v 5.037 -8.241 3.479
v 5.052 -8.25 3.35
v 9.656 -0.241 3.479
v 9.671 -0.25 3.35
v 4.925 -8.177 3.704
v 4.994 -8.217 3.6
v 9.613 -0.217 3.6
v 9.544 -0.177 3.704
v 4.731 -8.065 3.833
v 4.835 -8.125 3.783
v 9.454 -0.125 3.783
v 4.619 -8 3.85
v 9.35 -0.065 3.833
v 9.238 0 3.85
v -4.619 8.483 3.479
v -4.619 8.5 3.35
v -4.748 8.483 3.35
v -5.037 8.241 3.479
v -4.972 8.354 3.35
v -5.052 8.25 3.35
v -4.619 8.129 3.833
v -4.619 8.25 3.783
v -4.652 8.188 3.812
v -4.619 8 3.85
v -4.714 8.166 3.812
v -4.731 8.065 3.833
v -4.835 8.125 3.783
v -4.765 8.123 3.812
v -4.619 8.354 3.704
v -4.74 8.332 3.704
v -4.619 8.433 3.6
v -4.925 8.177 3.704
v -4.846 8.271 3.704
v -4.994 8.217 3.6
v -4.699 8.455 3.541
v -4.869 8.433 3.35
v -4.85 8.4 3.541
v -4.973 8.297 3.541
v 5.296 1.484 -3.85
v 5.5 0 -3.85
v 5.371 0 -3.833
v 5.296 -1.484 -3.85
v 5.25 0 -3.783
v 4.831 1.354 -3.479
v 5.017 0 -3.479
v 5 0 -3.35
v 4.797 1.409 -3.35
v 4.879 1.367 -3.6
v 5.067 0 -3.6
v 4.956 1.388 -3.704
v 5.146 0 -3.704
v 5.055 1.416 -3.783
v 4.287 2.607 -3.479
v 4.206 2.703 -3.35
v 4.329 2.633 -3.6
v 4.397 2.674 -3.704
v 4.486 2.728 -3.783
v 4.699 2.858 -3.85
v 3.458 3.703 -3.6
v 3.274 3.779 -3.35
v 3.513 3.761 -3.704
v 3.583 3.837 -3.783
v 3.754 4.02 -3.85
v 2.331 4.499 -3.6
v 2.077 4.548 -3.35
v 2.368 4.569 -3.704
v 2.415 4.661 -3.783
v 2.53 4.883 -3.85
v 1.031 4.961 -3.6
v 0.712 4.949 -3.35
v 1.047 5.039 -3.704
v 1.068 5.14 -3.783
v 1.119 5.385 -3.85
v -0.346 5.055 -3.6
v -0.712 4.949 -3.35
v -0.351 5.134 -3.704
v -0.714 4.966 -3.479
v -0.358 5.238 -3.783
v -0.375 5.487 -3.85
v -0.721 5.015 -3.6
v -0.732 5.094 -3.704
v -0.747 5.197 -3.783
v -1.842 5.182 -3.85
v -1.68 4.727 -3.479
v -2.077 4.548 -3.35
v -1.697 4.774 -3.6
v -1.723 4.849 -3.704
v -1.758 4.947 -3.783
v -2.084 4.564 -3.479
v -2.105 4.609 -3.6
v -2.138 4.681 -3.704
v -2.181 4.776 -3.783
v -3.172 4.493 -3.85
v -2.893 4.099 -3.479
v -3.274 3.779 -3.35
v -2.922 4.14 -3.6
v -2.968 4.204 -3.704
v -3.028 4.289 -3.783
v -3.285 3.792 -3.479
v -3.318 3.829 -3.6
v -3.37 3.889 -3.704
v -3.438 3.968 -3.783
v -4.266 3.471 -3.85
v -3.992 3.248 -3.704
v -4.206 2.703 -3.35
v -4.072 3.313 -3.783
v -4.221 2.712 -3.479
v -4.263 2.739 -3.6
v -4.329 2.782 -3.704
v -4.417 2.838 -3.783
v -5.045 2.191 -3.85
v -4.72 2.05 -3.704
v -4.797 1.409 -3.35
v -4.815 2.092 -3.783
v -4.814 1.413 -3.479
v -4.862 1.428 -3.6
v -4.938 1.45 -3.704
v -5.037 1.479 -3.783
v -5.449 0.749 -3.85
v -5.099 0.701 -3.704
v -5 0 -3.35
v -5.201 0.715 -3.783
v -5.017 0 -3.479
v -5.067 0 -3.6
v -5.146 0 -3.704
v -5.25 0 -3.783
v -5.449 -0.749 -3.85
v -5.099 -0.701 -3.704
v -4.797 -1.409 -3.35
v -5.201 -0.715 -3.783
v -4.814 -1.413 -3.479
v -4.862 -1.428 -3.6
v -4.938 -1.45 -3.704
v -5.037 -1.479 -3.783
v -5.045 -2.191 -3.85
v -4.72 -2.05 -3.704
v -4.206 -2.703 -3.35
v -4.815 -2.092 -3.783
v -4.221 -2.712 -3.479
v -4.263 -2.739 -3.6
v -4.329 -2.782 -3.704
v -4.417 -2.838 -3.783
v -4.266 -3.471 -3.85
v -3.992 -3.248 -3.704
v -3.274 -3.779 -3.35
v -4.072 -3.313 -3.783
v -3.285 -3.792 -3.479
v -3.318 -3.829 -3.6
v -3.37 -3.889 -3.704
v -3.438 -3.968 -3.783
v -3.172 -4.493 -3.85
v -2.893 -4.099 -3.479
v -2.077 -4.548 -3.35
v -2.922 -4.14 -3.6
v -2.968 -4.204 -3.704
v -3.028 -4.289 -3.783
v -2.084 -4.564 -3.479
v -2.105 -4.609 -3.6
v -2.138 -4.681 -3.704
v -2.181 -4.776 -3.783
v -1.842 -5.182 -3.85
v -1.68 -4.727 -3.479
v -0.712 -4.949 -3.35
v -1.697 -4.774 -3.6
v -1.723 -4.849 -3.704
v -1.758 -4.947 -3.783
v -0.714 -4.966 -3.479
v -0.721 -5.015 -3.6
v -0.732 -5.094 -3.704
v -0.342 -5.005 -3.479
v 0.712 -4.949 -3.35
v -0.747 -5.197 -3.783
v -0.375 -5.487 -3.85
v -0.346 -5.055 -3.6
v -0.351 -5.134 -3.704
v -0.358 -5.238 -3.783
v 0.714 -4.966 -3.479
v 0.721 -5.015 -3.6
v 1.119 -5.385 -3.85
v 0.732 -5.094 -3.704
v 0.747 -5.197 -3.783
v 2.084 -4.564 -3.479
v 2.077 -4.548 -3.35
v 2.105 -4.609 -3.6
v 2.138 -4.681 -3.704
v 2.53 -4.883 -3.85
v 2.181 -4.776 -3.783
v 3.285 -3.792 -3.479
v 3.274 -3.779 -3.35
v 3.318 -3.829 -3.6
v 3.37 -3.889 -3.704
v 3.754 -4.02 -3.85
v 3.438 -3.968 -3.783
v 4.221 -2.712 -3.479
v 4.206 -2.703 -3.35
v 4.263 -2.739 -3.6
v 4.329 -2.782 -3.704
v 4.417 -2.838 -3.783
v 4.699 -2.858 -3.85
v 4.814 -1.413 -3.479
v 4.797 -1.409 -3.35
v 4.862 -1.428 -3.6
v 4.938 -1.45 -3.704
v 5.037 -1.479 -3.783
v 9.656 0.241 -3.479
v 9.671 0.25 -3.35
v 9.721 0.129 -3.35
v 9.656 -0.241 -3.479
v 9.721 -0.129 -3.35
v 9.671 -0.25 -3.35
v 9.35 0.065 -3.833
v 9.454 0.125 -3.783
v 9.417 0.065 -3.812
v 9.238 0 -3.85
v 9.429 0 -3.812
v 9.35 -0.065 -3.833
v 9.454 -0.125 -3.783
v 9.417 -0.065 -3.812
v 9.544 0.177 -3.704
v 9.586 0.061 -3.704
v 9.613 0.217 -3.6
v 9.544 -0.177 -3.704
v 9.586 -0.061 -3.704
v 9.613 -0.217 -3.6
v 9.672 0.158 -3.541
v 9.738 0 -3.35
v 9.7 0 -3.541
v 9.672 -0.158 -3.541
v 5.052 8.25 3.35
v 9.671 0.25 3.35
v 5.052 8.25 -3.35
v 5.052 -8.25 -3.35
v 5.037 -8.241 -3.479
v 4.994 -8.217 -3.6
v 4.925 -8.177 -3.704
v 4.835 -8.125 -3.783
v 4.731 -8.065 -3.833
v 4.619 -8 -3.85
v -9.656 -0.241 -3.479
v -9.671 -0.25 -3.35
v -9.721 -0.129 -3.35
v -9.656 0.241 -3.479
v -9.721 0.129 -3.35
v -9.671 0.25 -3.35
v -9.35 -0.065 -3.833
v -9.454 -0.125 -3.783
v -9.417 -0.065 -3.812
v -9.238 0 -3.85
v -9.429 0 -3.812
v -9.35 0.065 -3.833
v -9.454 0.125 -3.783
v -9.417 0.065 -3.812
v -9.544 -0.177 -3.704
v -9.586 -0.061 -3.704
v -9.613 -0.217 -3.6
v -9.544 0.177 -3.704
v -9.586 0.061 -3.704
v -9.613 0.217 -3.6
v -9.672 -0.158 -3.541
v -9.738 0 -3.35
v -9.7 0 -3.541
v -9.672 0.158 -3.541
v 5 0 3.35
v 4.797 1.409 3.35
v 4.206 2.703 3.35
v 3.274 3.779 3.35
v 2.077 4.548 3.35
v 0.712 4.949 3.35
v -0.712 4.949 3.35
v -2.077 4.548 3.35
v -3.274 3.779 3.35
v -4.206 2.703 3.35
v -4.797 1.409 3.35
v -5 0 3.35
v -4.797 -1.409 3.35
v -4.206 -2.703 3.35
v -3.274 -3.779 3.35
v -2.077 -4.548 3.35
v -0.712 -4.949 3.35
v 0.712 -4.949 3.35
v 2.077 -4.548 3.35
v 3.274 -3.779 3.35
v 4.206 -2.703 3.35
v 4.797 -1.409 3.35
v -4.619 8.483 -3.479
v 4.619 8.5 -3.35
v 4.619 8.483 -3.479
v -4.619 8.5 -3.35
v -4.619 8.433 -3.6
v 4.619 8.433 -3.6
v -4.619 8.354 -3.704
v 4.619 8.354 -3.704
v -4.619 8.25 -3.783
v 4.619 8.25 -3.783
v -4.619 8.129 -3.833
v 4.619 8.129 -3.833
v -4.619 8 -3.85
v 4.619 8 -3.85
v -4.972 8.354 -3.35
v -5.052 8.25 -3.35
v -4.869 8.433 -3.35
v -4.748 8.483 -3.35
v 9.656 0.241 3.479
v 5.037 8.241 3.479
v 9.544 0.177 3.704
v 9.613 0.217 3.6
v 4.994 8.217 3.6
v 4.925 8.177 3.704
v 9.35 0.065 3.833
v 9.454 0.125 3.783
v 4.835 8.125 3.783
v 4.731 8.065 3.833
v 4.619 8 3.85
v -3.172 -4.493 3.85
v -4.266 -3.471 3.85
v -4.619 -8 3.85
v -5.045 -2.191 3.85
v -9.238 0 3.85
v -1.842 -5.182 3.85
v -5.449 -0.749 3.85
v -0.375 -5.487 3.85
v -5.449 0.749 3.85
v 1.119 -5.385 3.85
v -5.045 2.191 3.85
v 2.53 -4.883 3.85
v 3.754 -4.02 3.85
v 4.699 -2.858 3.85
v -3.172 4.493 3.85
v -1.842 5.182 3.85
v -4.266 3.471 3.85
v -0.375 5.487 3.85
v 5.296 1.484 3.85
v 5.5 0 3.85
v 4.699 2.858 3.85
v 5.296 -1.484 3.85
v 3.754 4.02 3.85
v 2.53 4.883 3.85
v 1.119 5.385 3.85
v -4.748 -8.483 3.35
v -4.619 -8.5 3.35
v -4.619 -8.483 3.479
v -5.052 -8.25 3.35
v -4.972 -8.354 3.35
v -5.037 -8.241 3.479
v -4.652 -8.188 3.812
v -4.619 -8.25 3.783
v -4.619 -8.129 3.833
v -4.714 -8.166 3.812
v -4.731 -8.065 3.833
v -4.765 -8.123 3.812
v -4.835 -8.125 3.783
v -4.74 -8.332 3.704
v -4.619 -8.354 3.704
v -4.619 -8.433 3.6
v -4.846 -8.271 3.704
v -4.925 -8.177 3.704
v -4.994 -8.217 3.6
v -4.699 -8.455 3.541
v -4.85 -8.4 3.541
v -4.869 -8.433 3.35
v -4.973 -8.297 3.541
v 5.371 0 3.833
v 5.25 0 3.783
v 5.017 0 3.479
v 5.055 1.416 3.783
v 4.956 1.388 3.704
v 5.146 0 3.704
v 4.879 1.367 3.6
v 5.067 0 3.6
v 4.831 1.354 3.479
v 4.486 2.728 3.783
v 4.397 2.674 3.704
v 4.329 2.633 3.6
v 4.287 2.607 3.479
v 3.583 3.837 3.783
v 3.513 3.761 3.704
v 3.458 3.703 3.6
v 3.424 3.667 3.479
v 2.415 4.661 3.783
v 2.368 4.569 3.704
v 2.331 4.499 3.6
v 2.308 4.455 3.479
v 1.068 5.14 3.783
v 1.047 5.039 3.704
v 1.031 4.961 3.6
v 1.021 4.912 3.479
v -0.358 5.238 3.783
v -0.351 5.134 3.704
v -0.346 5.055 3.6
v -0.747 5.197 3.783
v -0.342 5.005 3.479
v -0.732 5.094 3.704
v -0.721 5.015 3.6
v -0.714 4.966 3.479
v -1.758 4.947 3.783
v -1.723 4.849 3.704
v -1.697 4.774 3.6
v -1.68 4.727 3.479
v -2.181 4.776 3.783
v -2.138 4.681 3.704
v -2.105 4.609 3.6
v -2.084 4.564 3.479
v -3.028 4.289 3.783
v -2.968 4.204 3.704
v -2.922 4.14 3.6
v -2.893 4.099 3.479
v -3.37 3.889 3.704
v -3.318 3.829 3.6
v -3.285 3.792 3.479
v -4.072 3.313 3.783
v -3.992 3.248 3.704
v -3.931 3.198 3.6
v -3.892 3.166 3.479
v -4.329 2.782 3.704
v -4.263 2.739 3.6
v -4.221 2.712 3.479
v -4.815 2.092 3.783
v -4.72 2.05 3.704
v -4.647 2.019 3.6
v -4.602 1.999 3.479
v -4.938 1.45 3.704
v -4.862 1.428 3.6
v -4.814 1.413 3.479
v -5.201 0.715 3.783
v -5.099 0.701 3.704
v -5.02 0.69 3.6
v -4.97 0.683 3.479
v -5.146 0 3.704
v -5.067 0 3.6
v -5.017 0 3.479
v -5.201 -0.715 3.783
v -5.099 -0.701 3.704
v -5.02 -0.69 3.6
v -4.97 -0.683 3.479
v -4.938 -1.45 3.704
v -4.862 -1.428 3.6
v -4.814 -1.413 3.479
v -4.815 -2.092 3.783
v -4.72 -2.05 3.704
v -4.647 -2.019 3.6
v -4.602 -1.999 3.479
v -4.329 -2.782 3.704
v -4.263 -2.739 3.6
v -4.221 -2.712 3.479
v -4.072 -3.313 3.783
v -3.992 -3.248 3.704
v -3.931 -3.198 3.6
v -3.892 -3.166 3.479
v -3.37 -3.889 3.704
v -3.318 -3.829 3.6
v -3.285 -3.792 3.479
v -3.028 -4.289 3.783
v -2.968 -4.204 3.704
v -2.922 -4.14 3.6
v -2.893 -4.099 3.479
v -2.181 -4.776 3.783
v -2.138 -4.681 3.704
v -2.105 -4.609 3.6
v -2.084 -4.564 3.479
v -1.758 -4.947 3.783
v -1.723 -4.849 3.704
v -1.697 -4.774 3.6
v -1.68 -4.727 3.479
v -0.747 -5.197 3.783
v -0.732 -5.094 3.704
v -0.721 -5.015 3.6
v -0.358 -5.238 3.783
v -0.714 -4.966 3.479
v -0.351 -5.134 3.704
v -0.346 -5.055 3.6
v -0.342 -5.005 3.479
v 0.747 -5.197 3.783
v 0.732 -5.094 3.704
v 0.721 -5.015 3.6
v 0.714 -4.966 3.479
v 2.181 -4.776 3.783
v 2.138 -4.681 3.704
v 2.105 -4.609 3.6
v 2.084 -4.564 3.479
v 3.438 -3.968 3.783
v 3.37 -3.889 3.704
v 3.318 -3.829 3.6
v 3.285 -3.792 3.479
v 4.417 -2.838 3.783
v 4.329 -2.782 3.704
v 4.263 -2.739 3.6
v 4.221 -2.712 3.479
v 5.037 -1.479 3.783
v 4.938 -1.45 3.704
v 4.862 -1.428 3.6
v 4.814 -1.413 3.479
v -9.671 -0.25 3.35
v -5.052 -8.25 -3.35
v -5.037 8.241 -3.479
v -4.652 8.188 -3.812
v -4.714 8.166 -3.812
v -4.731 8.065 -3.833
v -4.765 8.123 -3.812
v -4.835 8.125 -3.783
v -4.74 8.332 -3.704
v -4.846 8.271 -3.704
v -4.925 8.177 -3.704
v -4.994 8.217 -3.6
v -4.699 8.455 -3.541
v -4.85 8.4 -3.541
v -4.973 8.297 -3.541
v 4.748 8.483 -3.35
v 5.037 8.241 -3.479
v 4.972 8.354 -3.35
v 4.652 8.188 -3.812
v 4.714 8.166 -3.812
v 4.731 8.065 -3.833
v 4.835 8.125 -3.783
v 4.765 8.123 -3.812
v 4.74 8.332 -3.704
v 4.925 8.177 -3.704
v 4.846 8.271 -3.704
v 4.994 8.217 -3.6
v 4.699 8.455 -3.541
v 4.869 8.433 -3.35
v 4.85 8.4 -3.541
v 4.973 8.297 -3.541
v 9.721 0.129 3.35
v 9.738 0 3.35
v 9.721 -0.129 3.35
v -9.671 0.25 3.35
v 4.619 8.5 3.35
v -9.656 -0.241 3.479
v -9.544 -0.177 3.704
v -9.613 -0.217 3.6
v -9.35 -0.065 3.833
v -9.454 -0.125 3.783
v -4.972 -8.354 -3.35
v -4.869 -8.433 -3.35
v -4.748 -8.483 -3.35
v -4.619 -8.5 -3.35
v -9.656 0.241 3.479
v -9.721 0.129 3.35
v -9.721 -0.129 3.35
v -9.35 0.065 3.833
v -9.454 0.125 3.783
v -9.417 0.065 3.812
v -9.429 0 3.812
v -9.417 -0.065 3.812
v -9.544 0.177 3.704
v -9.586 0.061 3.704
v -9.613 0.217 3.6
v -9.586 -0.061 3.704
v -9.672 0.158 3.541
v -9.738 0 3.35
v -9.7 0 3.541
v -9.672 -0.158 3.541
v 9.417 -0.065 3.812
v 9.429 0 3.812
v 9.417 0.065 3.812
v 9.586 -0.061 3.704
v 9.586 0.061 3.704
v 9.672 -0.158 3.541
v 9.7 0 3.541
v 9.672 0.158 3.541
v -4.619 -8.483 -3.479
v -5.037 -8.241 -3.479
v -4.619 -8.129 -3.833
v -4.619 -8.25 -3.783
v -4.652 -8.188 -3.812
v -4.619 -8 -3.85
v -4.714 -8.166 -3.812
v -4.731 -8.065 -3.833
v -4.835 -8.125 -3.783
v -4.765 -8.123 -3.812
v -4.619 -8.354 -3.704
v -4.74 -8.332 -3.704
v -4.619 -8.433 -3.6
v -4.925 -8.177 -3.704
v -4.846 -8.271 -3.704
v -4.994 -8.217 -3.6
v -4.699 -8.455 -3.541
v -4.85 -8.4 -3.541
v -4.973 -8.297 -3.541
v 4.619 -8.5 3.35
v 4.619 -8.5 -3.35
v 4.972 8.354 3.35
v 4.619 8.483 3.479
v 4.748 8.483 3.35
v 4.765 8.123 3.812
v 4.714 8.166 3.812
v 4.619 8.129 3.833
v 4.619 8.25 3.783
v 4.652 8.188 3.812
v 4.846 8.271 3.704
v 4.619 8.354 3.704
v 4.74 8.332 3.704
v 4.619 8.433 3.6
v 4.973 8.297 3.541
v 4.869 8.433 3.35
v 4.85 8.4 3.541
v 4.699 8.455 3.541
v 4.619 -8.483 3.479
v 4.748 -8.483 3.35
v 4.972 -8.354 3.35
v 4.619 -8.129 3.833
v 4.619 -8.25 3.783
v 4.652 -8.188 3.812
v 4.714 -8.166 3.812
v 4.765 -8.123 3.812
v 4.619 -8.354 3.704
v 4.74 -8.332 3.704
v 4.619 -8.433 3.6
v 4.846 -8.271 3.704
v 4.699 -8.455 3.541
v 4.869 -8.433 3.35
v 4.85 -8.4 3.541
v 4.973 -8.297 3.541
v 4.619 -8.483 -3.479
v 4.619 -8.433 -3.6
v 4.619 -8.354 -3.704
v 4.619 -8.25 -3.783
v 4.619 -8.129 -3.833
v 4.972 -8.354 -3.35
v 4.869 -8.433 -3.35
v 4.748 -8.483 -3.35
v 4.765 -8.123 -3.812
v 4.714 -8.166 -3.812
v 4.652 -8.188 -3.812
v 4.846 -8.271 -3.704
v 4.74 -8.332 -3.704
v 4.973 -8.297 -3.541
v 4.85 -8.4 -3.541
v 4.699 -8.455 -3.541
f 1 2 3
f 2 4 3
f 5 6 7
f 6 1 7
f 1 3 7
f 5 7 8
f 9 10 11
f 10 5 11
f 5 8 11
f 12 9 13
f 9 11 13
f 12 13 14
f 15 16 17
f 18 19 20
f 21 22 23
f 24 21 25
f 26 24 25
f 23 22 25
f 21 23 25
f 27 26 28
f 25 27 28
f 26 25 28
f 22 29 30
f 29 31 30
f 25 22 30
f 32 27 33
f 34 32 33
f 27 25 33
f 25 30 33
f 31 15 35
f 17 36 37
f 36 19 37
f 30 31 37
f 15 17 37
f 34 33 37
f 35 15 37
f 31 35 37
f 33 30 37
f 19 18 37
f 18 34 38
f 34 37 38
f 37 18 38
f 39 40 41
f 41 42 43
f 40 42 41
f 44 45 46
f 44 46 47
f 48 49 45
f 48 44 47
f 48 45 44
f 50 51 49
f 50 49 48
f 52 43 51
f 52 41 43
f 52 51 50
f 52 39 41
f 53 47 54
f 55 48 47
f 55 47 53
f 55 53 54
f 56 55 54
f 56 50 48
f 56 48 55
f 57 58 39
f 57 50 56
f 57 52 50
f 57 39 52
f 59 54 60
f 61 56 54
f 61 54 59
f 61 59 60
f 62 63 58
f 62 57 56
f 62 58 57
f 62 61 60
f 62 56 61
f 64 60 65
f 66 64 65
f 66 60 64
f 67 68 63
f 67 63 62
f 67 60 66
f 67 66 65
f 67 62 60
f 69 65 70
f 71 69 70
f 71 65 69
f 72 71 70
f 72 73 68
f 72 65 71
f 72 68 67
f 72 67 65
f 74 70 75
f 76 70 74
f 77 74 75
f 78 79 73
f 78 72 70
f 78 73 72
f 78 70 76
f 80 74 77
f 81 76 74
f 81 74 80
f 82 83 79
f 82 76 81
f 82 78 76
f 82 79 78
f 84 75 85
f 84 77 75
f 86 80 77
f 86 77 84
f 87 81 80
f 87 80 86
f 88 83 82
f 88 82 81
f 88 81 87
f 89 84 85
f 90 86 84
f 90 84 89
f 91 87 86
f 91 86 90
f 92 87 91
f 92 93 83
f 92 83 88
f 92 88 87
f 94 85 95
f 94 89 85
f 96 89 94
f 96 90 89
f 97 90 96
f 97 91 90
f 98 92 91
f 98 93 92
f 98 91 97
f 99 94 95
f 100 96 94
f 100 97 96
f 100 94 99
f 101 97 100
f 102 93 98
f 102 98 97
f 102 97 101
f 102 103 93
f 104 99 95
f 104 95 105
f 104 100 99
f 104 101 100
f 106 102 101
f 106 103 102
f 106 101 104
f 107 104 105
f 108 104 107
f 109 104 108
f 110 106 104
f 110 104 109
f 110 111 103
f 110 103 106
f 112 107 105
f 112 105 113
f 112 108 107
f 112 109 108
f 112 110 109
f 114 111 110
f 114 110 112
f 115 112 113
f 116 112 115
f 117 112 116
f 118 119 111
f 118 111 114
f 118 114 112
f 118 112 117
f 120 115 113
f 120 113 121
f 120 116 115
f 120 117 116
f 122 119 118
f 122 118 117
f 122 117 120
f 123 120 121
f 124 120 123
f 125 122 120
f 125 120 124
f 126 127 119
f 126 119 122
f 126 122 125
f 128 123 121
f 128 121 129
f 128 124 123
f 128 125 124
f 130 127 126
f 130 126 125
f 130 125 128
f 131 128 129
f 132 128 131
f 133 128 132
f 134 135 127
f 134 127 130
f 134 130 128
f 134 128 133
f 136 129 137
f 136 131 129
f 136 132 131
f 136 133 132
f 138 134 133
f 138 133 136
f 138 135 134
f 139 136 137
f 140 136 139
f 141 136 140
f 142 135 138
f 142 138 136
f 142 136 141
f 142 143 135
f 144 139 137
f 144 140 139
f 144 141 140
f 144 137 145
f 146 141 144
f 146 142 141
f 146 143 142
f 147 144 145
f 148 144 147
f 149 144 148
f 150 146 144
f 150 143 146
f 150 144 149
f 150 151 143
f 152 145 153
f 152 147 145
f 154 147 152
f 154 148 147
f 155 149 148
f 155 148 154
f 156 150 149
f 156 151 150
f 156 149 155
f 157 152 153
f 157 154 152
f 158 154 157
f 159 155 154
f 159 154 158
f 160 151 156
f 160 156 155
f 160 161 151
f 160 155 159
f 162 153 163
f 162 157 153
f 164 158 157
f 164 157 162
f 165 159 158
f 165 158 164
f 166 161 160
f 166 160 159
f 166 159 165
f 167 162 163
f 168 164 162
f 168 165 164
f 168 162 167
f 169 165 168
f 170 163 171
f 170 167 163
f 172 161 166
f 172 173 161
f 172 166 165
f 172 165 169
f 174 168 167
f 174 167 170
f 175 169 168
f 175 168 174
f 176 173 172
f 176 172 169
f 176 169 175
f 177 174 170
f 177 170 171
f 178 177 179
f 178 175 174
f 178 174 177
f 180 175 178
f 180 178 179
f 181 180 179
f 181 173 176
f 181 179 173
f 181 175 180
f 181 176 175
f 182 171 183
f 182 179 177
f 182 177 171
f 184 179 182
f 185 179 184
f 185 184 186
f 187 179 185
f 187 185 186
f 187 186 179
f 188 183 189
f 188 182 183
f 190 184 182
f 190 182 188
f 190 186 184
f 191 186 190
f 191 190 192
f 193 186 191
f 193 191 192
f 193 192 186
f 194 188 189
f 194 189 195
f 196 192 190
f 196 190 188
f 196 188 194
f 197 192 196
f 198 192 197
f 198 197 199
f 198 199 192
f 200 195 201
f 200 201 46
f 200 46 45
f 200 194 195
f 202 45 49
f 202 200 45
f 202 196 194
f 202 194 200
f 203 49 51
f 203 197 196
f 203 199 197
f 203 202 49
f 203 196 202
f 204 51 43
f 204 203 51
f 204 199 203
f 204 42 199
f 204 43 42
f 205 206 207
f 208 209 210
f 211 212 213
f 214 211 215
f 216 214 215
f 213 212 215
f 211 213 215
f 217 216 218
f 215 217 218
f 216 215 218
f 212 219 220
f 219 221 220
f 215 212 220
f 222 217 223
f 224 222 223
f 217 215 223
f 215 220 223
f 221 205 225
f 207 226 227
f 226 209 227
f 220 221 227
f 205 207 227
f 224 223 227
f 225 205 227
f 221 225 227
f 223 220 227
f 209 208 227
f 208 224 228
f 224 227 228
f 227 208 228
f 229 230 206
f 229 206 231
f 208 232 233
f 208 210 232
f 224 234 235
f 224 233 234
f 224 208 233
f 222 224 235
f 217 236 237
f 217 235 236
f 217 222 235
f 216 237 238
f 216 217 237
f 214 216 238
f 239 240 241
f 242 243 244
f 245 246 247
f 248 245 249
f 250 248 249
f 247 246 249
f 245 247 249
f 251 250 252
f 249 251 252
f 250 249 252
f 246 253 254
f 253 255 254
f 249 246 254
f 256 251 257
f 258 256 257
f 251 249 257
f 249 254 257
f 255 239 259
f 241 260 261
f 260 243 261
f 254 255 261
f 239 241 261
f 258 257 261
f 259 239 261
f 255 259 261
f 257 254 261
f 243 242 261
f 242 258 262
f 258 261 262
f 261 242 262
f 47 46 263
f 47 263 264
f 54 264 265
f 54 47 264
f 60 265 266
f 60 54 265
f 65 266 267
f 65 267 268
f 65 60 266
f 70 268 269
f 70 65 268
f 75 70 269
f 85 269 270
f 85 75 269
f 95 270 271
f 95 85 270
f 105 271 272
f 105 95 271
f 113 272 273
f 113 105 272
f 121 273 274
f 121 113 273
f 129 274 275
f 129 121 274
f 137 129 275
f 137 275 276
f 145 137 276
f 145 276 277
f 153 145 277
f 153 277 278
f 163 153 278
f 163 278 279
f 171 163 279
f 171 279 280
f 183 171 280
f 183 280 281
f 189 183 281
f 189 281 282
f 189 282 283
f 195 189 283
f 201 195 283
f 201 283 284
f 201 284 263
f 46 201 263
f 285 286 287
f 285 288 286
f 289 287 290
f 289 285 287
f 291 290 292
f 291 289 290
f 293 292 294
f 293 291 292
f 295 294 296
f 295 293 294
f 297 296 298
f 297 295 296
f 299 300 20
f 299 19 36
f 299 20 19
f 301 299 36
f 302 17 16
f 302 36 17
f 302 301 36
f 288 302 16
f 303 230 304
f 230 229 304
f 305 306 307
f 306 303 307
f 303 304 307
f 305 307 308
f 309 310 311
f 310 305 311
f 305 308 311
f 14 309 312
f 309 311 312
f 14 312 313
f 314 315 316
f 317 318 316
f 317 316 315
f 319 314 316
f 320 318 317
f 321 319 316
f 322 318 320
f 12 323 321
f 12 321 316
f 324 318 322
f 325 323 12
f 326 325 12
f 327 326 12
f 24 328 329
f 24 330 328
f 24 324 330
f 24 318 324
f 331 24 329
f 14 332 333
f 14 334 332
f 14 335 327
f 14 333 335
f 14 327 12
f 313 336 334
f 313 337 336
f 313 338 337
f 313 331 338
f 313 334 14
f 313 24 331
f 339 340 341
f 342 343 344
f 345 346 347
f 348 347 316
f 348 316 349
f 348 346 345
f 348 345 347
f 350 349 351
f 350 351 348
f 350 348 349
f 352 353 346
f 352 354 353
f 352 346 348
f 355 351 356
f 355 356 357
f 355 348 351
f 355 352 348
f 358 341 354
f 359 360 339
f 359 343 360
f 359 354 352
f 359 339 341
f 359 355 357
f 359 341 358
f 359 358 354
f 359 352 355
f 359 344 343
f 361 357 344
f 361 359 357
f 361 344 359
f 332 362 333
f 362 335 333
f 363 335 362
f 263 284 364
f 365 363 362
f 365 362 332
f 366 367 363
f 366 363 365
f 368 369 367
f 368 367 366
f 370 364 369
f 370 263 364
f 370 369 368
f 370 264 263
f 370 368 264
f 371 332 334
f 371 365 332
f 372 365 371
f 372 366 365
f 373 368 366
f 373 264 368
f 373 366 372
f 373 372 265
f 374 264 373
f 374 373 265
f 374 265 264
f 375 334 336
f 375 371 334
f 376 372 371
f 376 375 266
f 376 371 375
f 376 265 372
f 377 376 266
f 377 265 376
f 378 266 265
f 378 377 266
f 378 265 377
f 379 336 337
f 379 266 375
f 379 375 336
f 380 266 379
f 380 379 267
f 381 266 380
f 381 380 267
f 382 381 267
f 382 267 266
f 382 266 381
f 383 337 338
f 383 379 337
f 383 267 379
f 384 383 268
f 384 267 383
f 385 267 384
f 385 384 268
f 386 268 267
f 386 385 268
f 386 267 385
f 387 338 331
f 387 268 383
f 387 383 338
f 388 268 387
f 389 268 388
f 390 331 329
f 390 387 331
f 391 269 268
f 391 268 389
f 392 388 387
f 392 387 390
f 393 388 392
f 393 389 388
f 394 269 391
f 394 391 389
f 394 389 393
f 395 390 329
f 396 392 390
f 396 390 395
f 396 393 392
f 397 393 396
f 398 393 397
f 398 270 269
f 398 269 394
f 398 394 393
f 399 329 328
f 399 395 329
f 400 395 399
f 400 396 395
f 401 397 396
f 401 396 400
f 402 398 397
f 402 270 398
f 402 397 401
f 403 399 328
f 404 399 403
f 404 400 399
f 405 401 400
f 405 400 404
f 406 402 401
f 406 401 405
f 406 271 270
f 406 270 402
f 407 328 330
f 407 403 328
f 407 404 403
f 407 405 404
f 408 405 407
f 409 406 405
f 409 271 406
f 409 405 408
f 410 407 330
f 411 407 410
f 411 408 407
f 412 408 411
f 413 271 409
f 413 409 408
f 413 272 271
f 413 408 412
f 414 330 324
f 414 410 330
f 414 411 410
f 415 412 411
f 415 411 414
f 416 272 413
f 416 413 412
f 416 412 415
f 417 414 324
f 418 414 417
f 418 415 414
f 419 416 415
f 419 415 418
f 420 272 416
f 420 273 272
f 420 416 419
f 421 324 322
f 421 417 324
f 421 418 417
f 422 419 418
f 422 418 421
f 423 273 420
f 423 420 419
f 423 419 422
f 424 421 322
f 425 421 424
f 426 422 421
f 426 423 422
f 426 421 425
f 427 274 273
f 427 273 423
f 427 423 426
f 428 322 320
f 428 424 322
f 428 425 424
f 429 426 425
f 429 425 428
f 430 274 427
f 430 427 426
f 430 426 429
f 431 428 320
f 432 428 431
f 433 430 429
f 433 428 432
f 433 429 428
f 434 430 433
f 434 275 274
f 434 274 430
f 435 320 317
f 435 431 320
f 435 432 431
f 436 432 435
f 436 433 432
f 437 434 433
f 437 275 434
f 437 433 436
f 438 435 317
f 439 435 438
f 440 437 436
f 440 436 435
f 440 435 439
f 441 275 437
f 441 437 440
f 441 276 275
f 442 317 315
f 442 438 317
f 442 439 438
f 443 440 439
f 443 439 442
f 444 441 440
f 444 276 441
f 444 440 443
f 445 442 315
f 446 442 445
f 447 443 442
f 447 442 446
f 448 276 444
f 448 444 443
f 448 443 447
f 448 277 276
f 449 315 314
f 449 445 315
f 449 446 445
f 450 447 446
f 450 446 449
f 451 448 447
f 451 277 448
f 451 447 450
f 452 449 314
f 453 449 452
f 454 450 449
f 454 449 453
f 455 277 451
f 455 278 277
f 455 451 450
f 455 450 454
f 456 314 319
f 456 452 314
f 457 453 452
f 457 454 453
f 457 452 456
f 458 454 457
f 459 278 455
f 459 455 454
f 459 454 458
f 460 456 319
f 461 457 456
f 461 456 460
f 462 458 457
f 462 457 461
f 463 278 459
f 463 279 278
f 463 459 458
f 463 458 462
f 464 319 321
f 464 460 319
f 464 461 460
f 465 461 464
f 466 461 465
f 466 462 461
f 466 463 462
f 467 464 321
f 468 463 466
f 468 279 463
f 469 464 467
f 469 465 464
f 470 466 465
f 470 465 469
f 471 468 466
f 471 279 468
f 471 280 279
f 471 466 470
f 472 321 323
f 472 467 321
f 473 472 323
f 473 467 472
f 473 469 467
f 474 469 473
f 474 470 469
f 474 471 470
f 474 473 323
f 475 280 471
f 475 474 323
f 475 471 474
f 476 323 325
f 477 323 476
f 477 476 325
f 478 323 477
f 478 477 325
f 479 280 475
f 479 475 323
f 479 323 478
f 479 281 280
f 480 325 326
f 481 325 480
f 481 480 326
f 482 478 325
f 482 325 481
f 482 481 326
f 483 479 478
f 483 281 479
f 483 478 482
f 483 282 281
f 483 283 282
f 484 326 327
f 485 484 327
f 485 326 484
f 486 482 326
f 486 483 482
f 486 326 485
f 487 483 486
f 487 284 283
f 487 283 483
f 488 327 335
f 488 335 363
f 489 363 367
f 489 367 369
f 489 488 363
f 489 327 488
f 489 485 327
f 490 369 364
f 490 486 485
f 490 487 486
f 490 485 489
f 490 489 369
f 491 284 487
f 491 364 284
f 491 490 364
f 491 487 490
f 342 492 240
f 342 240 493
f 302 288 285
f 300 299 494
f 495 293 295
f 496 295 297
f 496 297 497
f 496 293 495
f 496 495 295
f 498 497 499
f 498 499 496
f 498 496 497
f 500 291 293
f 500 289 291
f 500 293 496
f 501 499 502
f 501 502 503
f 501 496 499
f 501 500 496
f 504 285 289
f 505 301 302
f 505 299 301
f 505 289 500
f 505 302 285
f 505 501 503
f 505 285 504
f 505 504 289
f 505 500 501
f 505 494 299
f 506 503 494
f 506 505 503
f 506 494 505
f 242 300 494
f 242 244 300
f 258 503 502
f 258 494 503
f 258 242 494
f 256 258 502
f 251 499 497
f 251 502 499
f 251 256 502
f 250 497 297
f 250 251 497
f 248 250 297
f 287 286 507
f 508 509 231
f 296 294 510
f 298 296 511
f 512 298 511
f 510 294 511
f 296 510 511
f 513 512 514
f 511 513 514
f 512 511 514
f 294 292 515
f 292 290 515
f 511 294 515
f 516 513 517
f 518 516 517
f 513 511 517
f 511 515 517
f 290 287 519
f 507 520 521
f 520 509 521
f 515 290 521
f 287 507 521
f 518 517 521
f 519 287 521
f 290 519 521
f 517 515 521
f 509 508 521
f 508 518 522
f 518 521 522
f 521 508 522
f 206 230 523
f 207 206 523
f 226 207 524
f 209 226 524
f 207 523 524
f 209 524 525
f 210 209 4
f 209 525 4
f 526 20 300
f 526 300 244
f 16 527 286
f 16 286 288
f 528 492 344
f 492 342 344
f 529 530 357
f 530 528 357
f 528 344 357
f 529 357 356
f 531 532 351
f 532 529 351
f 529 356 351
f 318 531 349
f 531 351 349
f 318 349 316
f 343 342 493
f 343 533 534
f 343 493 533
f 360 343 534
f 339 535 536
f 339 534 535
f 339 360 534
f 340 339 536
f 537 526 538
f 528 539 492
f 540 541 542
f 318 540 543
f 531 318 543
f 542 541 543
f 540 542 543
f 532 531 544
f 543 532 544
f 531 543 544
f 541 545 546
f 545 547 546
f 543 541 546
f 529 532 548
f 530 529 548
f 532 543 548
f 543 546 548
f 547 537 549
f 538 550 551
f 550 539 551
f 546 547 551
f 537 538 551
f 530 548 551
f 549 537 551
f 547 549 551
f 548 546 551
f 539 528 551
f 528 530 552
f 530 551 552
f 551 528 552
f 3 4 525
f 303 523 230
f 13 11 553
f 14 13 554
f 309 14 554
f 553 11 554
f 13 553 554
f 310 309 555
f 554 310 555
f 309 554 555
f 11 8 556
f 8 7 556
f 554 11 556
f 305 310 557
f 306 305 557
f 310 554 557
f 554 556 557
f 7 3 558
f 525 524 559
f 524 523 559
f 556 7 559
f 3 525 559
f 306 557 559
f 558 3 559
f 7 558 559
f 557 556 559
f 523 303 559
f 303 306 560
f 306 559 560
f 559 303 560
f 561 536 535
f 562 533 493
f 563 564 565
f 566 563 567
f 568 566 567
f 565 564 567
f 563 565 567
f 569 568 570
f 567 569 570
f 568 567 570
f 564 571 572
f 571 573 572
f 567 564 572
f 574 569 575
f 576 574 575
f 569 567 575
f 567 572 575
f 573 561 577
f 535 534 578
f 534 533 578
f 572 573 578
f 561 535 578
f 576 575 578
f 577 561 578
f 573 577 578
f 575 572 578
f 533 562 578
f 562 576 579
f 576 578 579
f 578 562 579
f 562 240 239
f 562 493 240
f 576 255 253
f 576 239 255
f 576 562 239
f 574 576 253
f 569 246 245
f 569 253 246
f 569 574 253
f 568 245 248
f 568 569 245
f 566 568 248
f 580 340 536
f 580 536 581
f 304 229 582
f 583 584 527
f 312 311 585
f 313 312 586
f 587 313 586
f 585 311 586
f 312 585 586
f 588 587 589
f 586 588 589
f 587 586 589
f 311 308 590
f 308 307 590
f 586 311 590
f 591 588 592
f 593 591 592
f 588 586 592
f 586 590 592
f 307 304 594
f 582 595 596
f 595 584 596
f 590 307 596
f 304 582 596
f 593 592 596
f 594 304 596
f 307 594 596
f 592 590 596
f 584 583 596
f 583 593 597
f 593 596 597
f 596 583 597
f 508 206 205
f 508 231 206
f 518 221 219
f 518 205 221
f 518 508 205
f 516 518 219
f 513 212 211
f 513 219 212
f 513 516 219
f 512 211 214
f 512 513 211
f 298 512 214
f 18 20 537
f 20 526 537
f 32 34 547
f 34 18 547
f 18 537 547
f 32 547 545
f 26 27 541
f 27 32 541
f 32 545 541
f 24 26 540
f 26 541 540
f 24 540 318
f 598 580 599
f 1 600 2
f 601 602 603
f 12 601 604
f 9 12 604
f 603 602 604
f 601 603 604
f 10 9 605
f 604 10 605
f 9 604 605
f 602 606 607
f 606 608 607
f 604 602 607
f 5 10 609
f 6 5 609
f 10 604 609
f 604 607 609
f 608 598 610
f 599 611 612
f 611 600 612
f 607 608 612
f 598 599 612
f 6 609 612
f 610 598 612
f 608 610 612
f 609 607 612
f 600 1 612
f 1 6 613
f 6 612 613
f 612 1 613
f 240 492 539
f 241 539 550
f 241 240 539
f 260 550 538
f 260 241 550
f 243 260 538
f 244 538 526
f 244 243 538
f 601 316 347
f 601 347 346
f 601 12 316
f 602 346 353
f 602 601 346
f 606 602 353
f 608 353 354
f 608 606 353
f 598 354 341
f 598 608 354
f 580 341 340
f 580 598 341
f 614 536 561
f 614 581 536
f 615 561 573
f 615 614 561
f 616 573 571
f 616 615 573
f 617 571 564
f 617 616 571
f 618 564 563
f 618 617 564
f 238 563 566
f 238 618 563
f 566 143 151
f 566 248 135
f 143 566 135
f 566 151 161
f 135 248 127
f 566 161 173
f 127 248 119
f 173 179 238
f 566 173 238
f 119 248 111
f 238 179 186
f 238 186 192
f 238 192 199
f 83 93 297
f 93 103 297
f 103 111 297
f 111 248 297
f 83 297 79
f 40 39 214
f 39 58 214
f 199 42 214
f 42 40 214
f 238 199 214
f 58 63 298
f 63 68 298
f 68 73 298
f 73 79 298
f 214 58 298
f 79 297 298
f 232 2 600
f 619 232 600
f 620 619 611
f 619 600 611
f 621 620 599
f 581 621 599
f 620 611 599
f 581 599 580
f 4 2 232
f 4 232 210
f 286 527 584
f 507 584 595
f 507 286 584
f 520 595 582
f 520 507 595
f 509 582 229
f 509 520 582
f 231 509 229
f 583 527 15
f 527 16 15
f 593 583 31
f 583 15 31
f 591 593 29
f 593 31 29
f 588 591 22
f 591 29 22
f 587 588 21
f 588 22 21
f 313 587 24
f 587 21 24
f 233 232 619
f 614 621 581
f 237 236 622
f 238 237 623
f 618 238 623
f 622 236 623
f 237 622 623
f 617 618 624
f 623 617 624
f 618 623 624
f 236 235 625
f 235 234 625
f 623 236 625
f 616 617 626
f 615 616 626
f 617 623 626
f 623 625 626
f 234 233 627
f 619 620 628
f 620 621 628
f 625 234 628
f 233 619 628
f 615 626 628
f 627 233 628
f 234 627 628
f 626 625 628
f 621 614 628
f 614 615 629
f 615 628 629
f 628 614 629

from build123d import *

# Parameters (mm, degrees)
SKIZZE1_R                       = 5
AUFSATZ_LINEAR_AUSTRAGEN1_DEPTH = 3.85
VERRUNDUNG1_R                   = 0.5


with BuildPart() as part:
    # Skizze1 → Aufsatz-Linear austragen1 (new body, symmetric)
    with BuildSketch(Plane.XY):
        Polygon((-9.814954576, 0), (-4.907477288, -8.5), (4.907477288, -8.5), (9.814954576, 0), (4.907477288, 8.5), (-4.907477288, 8.5), align=None)
        Circle(SKIZZE1_R, mode=Mode.SUBTRACT)
    extrude(amount=AUFSATZ_LINEAR_AUSTRAGEN1_DEPTH, both=True)

    # Verrundung1
    verrundung1_edges = [part.edges().sort_by_distance(p)[0] for p in [
        (-4.907477288, 8.5, 0),
        (4.907477288, 8.5, 0),
        (9.814954576, 0, 0),
        (4.907477288, -8.5, 0),
        (-4.907477288, -8.5, 0),
        (-9.814954576, 0, 0),
        (0, -8.5, 3.85),
        (7.361215932, -4.25, 3.85),
        (-5, 0, -3.85),
        (-5, 0, 3.85),
        (7.361215932, 4.25, 3.85),
        (0, 8.5, 3.85),
        (-7.361215932, 4.25, 3.85),
        (0, 8.5, -3.85),
        (7.361215932, 4.25, -3.85),
        (7.361215932, -4.25, -3.85),
        (0, -8.5, -3.85),
        (-7.361215932, -4.25, -3.85),
        (-7.361215932, 4.25, -3.85),
        (-7.361215932, -4.25, 3.85),
    ]]
    fillet(verrundung1_edges, radius=VERRUNDUNG1_R)


solid = part.part
